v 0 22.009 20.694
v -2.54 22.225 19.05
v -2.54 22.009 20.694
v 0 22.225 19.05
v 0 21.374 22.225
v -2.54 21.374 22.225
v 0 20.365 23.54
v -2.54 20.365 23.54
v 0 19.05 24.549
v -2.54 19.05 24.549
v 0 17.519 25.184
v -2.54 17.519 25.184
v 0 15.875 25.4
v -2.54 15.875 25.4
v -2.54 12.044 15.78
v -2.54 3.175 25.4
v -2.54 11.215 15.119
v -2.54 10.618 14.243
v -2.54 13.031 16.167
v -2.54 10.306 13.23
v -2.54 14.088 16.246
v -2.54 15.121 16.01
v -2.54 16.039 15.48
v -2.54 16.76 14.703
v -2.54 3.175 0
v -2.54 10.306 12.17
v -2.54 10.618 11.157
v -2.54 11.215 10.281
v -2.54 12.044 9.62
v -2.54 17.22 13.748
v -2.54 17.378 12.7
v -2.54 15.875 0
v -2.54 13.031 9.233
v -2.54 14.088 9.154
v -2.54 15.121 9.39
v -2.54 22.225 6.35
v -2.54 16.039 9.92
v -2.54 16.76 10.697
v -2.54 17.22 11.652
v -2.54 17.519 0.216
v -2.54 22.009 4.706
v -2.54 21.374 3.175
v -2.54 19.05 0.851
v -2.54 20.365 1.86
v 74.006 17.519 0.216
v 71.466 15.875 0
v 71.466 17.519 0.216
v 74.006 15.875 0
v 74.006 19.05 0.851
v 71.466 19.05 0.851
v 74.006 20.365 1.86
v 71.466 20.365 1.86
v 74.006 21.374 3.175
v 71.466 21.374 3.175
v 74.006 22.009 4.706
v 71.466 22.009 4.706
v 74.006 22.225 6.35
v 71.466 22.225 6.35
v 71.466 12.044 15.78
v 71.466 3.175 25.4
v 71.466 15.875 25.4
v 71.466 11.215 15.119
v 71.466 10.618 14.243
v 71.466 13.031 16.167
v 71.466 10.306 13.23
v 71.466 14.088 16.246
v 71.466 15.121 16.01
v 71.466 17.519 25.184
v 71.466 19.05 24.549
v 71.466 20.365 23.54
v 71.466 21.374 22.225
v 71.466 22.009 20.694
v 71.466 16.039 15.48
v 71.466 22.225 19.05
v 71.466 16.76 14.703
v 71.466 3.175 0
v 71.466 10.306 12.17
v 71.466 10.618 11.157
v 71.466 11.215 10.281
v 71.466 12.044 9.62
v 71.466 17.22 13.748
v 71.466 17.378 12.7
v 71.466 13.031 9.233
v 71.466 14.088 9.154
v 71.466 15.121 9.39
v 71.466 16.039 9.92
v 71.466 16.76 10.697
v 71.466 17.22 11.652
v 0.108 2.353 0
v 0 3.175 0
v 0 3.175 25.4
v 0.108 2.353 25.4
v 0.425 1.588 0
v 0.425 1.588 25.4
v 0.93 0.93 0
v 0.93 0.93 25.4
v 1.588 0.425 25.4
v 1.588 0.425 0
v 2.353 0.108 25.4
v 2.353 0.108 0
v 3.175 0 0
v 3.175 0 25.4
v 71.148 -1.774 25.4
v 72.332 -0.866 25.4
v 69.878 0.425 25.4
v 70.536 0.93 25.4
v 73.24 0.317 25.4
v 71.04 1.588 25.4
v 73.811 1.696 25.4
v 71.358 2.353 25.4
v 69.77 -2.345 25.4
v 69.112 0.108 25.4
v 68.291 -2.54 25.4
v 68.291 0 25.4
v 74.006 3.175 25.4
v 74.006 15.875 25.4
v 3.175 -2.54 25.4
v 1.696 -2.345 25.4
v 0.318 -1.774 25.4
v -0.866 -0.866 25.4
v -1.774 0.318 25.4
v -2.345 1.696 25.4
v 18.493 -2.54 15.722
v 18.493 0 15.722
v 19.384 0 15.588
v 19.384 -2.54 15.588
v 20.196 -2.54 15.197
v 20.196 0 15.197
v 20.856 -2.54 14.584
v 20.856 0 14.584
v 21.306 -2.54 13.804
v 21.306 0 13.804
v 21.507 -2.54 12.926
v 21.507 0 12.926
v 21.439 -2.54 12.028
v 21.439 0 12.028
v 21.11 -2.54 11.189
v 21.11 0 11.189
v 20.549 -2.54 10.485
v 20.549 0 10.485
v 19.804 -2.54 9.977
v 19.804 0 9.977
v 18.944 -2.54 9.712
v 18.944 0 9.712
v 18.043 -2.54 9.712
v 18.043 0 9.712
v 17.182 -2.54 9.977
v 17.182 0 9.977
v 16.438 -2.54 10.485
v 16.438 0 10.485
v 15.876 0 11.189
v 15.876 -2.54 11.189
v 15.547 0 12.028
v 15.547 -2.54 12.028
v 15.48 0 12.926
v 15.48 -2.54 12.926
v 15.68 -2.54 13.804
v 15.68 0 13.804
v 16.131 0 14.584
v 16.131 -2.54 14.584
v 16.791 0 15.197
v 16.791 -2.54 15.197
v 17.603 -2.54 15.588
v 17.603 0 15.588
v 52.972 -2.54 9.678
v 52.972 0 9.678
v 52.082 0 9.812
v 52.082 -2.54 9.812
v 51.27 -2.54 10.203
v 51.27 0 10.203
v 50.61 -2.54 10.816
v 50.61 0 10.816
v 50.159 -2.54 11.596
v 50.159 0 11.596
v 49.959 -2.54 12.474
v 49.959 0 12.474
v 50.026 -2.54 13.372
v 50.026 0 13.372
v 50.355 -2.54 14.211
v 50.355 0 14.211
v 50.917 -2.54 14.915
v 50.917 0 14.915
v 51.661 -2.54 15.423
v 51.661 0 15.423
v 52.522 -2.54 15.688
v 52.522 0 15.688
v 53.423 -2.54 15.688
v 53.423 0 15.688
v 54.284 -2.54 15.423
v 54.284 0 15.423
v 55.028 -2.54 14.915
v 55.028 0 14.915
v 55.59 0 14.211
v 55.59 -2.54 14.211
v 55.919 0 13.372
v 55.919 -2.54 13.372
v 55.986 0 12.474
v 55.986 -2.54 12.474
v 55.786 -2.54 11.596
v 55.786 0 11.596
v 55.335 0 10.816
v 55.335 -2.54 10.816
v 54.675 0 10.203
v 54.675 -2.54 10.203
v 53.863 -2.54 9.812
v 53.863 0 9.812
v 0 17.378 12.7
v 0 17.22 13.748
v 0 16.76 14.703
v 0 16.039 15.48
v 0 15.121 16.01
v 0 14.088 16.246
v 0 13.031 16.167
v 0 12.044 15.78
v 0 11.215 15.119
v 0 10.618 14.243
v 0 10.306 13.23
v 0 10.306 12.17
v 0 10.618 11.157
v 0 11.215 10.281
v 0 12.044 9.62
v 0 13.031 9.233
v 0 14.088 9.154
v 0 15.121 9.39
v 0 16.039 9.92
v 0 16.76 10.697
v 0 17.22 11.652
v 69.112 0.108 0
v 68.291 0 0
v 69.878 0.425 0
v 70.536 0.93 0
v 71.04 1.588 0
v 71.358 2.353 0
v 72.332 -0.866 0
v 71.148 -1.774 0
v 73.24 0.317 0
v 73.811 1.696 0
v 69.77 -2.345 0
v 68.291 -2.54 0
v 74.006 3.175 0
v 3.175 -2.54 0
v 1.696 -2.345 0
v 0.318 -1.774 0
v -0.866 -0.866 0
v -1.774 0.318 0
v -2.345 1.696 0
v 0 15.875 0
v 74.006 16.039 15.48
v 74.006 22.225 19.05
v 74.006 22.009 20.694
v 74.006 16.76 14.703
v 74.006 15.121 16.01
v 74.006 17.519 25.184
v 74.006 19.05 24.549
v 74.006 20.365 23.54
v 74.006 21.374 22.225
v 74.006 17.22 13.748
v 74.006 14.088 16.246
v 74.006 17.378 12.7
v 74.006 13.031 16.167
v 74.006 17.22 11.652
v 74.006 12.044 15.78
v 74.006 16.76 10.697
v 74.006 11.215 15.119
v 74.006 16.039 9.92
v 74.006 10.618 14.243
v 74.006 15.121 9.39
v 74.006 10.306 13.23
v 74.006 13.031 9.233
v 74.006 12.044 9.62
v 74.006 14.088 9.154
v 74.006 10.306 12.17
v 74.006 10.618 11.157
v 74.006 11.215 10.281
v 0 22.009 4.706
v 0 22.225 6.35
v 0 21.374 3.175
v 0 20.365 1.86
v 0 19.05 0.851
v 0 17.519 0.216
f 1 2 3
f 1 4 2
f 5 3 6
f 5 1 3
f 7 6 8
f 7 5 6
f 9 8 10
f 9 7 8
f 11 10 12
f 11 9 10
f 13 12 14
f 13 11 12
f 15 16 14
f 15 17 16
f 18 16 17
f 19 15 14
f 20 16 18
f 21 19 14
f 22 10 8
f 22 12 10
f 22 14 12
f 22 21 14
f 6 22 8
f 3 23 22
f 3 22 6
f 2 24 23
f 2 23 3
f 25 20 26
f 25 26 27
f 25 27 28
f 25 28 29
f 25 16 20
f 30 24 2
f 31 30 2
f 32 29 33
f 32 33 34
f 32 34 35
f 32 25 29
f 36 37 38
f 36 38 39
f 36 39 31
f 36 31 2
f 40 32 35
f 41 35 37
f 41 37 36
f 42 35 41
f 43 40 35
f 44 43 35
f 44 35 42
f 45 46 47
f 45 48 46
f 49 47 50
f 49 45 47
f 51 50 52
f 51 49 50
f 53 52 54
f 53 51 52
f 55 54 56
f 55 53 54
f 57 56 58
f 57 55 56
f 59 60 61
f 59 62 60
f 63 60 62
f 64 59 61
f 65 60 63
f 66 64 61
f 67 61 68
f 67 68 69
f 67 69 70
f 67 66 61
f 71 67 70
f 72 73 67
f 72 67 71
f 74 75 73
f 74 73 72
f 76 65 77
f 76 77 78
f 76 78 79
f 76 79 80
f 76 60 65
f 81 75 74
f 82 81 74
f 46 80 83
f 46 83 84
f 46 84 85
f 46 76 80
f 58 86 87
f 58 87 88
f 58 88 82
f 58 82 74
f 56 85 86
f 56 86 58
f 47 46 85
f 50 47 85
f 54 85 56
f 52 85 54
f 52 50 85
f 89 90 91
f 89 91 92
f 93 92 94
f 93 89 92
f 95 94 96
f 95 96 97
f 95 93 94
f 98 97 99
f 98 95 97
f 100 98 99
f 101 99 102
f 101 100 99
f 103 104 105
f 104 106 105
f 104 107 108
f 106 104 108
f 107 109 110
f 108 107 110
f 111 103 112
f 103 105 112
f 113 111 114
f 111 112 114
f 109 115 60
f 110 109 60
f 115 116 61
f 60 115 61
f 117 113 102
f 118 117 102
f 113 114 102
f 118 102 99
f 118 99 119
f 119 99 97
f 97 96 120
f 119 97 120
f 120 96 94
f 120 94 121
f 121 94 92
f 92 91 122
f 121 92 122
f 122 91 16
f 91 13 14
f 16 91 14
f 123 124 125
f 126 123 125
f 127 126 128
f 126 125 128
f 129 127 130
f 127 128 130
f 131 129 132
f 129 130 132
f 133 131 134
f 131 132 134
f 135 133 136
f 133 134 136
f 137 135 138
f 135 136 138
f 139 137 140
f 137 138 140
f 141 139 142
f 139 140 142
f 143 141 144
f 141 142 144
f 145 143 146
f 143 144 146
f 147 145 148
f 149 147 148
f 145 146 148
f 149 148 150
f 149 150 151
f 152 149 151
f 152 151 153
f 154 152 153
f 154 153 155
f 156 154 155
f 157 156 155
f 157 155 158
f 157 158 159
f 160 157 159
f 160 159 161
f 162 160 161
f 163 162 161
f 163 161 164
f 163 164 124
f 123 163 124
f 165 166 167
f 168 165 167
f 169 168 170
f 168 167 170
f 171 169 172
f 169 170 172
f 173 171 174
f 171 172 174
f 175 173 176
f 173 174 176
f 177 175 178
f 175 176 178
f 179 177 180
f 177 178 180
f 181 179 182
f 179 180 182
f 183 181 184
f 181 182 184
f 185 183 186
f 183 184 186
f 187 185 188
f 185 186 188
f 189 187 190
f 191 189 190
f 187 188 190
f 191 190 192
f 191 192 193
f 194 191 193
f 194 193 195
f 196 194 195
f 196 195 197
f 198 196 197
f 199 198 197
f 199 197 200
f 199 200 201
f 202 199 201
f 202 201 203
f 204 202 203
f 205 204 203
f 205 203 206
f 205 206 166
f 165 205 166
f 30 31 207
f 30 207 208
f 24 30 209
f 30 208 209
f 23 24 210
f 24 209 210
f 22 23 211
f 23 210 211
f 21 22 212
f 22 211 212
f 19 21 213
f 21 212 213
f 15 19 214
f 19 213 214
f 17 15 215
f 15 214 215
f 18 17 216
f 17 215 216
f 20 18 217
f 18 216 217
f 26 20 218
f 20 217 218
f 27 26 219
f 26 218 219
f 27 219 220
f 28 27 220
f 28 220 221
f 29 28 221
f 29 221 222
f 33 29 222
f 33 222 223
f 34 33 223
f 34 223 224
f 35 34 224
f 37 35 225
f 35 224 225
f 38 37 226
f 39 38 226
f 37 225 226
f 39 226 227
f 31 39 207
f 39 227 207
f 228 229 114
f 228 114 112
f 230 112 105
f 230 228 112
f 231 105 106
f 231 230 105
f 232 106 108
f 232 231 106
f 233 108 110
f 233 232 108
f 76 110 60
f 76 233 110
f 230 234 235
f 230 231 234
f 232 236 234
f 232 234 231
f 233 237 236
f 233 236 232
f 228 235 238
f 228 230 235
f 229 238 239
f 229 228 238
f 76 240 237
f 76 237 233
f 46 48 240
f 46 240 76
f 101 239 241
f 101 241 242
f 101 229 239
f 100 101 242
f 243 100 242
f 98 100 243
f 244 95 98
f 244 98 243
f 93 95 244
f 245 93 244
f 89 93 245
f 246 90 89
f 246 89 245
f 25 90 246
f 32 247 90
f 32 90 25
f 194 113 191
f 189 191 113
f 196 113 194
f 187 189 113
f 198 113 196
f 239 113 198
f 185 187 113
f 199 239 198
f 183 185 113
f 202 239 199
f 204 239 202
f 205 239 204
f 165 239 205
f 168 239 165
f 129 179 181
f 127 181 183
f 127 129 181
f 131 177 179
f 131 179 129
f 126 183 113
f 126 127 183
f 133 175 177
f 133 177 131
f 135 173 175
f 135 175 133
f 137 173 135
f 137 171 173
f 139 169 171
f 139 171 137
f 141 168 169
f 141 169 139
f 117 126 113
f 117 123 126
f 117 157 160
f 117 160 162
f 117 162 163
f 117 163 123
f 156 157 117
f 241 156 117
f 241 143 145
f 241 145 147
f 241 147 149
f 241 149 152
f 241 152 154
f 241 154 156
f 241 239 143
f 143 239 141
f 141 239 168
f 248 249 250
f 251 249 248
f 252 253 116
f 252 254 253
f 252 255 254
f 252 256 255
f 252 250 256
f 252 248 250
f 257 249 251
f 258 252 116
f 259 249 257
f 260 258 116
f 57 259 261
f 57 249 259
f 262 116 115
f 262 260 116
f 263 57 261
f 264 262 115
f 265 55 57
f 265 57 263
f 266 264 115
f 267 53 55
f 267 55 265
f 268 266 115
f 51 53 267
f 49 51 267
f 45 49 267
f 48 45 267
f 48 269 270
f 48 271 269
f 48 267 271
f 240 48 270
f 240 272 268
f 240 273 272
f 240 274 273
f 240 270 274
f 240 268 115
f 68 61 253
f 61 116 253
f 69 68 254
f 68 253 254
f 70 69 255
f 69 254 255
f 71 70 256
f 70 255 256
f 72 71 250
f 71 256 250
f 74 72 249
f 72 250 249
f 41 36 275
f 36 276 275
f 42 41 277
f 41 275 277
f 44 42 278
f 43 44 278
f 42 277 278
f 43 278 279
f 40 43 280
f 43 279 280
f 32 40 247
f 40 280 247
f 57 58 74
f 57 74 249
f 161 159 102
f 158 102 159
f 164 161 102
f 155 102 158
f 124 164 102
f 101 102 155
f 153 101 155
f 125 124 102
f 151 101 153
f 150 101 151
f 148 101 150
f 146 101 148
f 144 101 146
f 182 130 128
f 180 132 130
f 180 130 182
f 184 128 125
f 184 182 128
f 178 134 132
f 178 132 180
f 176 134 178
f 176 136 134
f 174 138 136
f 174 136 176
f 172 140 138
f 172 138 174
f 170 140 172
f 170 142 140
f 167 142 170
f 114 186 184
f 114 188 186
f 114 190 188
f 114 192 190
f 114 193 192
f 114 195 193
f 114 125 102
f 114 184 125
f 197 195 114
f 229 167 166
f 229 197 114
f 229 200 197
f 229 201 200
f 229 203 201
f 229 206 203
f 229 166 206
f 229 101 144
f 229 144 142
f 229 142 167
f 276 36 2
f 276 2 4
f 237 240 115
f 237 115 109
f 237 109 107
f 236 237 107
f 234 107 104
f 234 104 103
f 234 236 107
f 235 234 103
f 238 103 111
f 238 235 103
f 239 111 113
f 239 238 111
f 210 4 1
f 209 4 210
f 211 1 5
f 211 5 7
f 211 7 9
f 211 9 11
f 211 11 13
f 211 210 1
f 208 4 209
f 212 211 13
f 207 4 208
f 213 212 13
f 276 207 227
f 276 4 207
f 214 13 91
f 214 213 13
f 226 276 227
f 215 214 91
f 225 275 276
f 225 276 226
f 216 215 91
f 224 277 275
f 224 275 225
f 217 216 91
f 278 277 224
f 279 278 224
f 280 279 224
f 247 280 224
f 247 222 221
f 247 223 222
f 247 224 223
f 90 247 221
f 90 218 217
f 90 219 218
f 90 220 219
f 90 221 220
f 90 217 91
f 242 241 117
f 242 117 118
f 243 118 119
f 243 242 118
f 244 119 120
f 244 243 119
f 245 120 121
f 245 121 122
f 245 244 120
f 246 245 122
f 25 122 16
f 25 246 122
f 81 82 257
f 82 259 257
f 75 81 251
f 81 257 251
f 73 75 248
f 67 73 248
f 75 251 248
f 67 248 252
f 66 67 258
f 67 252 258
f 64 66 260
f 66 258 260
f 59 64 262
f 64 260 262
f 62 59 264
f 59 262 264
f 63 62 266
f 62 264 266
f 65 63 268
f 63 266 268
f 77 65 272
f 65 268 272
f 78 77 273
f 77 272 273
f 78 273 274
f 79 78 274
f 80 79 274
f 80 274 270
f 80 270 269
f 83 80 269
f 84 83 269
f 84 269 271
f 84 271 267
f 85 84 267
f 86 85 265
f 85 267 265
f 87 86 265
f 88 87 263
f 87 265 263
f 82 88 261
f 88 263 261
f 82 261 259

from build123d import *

# Parameters (mm, degrees)
EXTRUDE_THIN1_DEPTH = 25.4
SKETCH3_R           = 3.021976596
EXTRUDE2_DEPTH      = 82.338554141
SKETCH4_R           = 3.556
EXTRUDE3_DEPTH      = 81.534
FILLET1_R           = 6.35


with BuildPart() as part:
    # Sketch1 → Extrude-Thin1 (new body)
    with BuildSketch(Plane.XY):
        with BuildLine():
            Line((0, 22.225), (0, 3.175))
            ThreePointArc((0, 3.175), (0.92993597, 0.92993597), (3.175, 0))
            Line((3.175, 0), (68.290741431, 0))
            ThreePointArc((68.290741431, 0), (70.535805461, 0.92993597), (71.465741431, 3.175))
            Line((71.465741431, 3.175), (71.465741431, 22.225))
            Line((71.465741431, 22.225), (74.005741431, 22.225))
            Line((74.005741431, 22.225), (74.005741431, 3.175))
            ThreePointArc((74.005741431, 3.175), (72.331856686, -0.866115254), (68.290741431, -2.54))
            Line((68.290741431, -2.54), (3.175, -2.54))
            ThreePointArc((3.175, -2.54), (-0.866115254, -0.866115254), (-2.54, 3.175))
            Line((-2.54, 3.175), (-2.54, 22.225))
            Line((-2.54, 22.225), (0, 22.225))
        make_face()
    extrude(amount=EXTRUDE_THIN1_DEPTH)

    # Sketch3 → Extrude2 (cut, through all)
    with BuildSketch(Plane(origin=(0, 0, 0), x_dir=(1, 0, 0), z_dir=(0, 1, 0))):
        with Locations(Location((18.493278585, -12.7, 0), (0, 0, 270))):
            Circle(SKETCH3_R)
        with Locations(Location((52.972462846, -12.7, 0), (0, 0, 90))):
            Circle(SKETCH3_R)
    extrude(amount=-EXTRUDE2_DEPTH, mode=Mode.SUBTRACT)

    # Sketch4 → Extrude3 (cut, symmetric)
    with BuildSketch(Plane(origin=(0, 0, 0), x_dir=(0, 0, -1), z_dir=(1, 0, 0))):
        with Locations(Location((-12.7, 13.821871469, 0), (0, 0, 90))):
            Circle(SKETCH4_R)
    extrude(amount=EXTRUDE3_DEPTH, both=True, mode=Mode.SUBTRACT)

    # Fillet1
    fillet1_edges = [part.edges().sort_by_distance(p)[0] for p in [
        (-1.27, 22.225, 0),
        (72.735741431, 22.225, 0),
        (-1.27, 22.225, 25.4),
        (72.735741431, 22.225, 25.4),
    ]]
    fillet(fillet1_edges, radius=FILLET1_R)


solid = part.part
